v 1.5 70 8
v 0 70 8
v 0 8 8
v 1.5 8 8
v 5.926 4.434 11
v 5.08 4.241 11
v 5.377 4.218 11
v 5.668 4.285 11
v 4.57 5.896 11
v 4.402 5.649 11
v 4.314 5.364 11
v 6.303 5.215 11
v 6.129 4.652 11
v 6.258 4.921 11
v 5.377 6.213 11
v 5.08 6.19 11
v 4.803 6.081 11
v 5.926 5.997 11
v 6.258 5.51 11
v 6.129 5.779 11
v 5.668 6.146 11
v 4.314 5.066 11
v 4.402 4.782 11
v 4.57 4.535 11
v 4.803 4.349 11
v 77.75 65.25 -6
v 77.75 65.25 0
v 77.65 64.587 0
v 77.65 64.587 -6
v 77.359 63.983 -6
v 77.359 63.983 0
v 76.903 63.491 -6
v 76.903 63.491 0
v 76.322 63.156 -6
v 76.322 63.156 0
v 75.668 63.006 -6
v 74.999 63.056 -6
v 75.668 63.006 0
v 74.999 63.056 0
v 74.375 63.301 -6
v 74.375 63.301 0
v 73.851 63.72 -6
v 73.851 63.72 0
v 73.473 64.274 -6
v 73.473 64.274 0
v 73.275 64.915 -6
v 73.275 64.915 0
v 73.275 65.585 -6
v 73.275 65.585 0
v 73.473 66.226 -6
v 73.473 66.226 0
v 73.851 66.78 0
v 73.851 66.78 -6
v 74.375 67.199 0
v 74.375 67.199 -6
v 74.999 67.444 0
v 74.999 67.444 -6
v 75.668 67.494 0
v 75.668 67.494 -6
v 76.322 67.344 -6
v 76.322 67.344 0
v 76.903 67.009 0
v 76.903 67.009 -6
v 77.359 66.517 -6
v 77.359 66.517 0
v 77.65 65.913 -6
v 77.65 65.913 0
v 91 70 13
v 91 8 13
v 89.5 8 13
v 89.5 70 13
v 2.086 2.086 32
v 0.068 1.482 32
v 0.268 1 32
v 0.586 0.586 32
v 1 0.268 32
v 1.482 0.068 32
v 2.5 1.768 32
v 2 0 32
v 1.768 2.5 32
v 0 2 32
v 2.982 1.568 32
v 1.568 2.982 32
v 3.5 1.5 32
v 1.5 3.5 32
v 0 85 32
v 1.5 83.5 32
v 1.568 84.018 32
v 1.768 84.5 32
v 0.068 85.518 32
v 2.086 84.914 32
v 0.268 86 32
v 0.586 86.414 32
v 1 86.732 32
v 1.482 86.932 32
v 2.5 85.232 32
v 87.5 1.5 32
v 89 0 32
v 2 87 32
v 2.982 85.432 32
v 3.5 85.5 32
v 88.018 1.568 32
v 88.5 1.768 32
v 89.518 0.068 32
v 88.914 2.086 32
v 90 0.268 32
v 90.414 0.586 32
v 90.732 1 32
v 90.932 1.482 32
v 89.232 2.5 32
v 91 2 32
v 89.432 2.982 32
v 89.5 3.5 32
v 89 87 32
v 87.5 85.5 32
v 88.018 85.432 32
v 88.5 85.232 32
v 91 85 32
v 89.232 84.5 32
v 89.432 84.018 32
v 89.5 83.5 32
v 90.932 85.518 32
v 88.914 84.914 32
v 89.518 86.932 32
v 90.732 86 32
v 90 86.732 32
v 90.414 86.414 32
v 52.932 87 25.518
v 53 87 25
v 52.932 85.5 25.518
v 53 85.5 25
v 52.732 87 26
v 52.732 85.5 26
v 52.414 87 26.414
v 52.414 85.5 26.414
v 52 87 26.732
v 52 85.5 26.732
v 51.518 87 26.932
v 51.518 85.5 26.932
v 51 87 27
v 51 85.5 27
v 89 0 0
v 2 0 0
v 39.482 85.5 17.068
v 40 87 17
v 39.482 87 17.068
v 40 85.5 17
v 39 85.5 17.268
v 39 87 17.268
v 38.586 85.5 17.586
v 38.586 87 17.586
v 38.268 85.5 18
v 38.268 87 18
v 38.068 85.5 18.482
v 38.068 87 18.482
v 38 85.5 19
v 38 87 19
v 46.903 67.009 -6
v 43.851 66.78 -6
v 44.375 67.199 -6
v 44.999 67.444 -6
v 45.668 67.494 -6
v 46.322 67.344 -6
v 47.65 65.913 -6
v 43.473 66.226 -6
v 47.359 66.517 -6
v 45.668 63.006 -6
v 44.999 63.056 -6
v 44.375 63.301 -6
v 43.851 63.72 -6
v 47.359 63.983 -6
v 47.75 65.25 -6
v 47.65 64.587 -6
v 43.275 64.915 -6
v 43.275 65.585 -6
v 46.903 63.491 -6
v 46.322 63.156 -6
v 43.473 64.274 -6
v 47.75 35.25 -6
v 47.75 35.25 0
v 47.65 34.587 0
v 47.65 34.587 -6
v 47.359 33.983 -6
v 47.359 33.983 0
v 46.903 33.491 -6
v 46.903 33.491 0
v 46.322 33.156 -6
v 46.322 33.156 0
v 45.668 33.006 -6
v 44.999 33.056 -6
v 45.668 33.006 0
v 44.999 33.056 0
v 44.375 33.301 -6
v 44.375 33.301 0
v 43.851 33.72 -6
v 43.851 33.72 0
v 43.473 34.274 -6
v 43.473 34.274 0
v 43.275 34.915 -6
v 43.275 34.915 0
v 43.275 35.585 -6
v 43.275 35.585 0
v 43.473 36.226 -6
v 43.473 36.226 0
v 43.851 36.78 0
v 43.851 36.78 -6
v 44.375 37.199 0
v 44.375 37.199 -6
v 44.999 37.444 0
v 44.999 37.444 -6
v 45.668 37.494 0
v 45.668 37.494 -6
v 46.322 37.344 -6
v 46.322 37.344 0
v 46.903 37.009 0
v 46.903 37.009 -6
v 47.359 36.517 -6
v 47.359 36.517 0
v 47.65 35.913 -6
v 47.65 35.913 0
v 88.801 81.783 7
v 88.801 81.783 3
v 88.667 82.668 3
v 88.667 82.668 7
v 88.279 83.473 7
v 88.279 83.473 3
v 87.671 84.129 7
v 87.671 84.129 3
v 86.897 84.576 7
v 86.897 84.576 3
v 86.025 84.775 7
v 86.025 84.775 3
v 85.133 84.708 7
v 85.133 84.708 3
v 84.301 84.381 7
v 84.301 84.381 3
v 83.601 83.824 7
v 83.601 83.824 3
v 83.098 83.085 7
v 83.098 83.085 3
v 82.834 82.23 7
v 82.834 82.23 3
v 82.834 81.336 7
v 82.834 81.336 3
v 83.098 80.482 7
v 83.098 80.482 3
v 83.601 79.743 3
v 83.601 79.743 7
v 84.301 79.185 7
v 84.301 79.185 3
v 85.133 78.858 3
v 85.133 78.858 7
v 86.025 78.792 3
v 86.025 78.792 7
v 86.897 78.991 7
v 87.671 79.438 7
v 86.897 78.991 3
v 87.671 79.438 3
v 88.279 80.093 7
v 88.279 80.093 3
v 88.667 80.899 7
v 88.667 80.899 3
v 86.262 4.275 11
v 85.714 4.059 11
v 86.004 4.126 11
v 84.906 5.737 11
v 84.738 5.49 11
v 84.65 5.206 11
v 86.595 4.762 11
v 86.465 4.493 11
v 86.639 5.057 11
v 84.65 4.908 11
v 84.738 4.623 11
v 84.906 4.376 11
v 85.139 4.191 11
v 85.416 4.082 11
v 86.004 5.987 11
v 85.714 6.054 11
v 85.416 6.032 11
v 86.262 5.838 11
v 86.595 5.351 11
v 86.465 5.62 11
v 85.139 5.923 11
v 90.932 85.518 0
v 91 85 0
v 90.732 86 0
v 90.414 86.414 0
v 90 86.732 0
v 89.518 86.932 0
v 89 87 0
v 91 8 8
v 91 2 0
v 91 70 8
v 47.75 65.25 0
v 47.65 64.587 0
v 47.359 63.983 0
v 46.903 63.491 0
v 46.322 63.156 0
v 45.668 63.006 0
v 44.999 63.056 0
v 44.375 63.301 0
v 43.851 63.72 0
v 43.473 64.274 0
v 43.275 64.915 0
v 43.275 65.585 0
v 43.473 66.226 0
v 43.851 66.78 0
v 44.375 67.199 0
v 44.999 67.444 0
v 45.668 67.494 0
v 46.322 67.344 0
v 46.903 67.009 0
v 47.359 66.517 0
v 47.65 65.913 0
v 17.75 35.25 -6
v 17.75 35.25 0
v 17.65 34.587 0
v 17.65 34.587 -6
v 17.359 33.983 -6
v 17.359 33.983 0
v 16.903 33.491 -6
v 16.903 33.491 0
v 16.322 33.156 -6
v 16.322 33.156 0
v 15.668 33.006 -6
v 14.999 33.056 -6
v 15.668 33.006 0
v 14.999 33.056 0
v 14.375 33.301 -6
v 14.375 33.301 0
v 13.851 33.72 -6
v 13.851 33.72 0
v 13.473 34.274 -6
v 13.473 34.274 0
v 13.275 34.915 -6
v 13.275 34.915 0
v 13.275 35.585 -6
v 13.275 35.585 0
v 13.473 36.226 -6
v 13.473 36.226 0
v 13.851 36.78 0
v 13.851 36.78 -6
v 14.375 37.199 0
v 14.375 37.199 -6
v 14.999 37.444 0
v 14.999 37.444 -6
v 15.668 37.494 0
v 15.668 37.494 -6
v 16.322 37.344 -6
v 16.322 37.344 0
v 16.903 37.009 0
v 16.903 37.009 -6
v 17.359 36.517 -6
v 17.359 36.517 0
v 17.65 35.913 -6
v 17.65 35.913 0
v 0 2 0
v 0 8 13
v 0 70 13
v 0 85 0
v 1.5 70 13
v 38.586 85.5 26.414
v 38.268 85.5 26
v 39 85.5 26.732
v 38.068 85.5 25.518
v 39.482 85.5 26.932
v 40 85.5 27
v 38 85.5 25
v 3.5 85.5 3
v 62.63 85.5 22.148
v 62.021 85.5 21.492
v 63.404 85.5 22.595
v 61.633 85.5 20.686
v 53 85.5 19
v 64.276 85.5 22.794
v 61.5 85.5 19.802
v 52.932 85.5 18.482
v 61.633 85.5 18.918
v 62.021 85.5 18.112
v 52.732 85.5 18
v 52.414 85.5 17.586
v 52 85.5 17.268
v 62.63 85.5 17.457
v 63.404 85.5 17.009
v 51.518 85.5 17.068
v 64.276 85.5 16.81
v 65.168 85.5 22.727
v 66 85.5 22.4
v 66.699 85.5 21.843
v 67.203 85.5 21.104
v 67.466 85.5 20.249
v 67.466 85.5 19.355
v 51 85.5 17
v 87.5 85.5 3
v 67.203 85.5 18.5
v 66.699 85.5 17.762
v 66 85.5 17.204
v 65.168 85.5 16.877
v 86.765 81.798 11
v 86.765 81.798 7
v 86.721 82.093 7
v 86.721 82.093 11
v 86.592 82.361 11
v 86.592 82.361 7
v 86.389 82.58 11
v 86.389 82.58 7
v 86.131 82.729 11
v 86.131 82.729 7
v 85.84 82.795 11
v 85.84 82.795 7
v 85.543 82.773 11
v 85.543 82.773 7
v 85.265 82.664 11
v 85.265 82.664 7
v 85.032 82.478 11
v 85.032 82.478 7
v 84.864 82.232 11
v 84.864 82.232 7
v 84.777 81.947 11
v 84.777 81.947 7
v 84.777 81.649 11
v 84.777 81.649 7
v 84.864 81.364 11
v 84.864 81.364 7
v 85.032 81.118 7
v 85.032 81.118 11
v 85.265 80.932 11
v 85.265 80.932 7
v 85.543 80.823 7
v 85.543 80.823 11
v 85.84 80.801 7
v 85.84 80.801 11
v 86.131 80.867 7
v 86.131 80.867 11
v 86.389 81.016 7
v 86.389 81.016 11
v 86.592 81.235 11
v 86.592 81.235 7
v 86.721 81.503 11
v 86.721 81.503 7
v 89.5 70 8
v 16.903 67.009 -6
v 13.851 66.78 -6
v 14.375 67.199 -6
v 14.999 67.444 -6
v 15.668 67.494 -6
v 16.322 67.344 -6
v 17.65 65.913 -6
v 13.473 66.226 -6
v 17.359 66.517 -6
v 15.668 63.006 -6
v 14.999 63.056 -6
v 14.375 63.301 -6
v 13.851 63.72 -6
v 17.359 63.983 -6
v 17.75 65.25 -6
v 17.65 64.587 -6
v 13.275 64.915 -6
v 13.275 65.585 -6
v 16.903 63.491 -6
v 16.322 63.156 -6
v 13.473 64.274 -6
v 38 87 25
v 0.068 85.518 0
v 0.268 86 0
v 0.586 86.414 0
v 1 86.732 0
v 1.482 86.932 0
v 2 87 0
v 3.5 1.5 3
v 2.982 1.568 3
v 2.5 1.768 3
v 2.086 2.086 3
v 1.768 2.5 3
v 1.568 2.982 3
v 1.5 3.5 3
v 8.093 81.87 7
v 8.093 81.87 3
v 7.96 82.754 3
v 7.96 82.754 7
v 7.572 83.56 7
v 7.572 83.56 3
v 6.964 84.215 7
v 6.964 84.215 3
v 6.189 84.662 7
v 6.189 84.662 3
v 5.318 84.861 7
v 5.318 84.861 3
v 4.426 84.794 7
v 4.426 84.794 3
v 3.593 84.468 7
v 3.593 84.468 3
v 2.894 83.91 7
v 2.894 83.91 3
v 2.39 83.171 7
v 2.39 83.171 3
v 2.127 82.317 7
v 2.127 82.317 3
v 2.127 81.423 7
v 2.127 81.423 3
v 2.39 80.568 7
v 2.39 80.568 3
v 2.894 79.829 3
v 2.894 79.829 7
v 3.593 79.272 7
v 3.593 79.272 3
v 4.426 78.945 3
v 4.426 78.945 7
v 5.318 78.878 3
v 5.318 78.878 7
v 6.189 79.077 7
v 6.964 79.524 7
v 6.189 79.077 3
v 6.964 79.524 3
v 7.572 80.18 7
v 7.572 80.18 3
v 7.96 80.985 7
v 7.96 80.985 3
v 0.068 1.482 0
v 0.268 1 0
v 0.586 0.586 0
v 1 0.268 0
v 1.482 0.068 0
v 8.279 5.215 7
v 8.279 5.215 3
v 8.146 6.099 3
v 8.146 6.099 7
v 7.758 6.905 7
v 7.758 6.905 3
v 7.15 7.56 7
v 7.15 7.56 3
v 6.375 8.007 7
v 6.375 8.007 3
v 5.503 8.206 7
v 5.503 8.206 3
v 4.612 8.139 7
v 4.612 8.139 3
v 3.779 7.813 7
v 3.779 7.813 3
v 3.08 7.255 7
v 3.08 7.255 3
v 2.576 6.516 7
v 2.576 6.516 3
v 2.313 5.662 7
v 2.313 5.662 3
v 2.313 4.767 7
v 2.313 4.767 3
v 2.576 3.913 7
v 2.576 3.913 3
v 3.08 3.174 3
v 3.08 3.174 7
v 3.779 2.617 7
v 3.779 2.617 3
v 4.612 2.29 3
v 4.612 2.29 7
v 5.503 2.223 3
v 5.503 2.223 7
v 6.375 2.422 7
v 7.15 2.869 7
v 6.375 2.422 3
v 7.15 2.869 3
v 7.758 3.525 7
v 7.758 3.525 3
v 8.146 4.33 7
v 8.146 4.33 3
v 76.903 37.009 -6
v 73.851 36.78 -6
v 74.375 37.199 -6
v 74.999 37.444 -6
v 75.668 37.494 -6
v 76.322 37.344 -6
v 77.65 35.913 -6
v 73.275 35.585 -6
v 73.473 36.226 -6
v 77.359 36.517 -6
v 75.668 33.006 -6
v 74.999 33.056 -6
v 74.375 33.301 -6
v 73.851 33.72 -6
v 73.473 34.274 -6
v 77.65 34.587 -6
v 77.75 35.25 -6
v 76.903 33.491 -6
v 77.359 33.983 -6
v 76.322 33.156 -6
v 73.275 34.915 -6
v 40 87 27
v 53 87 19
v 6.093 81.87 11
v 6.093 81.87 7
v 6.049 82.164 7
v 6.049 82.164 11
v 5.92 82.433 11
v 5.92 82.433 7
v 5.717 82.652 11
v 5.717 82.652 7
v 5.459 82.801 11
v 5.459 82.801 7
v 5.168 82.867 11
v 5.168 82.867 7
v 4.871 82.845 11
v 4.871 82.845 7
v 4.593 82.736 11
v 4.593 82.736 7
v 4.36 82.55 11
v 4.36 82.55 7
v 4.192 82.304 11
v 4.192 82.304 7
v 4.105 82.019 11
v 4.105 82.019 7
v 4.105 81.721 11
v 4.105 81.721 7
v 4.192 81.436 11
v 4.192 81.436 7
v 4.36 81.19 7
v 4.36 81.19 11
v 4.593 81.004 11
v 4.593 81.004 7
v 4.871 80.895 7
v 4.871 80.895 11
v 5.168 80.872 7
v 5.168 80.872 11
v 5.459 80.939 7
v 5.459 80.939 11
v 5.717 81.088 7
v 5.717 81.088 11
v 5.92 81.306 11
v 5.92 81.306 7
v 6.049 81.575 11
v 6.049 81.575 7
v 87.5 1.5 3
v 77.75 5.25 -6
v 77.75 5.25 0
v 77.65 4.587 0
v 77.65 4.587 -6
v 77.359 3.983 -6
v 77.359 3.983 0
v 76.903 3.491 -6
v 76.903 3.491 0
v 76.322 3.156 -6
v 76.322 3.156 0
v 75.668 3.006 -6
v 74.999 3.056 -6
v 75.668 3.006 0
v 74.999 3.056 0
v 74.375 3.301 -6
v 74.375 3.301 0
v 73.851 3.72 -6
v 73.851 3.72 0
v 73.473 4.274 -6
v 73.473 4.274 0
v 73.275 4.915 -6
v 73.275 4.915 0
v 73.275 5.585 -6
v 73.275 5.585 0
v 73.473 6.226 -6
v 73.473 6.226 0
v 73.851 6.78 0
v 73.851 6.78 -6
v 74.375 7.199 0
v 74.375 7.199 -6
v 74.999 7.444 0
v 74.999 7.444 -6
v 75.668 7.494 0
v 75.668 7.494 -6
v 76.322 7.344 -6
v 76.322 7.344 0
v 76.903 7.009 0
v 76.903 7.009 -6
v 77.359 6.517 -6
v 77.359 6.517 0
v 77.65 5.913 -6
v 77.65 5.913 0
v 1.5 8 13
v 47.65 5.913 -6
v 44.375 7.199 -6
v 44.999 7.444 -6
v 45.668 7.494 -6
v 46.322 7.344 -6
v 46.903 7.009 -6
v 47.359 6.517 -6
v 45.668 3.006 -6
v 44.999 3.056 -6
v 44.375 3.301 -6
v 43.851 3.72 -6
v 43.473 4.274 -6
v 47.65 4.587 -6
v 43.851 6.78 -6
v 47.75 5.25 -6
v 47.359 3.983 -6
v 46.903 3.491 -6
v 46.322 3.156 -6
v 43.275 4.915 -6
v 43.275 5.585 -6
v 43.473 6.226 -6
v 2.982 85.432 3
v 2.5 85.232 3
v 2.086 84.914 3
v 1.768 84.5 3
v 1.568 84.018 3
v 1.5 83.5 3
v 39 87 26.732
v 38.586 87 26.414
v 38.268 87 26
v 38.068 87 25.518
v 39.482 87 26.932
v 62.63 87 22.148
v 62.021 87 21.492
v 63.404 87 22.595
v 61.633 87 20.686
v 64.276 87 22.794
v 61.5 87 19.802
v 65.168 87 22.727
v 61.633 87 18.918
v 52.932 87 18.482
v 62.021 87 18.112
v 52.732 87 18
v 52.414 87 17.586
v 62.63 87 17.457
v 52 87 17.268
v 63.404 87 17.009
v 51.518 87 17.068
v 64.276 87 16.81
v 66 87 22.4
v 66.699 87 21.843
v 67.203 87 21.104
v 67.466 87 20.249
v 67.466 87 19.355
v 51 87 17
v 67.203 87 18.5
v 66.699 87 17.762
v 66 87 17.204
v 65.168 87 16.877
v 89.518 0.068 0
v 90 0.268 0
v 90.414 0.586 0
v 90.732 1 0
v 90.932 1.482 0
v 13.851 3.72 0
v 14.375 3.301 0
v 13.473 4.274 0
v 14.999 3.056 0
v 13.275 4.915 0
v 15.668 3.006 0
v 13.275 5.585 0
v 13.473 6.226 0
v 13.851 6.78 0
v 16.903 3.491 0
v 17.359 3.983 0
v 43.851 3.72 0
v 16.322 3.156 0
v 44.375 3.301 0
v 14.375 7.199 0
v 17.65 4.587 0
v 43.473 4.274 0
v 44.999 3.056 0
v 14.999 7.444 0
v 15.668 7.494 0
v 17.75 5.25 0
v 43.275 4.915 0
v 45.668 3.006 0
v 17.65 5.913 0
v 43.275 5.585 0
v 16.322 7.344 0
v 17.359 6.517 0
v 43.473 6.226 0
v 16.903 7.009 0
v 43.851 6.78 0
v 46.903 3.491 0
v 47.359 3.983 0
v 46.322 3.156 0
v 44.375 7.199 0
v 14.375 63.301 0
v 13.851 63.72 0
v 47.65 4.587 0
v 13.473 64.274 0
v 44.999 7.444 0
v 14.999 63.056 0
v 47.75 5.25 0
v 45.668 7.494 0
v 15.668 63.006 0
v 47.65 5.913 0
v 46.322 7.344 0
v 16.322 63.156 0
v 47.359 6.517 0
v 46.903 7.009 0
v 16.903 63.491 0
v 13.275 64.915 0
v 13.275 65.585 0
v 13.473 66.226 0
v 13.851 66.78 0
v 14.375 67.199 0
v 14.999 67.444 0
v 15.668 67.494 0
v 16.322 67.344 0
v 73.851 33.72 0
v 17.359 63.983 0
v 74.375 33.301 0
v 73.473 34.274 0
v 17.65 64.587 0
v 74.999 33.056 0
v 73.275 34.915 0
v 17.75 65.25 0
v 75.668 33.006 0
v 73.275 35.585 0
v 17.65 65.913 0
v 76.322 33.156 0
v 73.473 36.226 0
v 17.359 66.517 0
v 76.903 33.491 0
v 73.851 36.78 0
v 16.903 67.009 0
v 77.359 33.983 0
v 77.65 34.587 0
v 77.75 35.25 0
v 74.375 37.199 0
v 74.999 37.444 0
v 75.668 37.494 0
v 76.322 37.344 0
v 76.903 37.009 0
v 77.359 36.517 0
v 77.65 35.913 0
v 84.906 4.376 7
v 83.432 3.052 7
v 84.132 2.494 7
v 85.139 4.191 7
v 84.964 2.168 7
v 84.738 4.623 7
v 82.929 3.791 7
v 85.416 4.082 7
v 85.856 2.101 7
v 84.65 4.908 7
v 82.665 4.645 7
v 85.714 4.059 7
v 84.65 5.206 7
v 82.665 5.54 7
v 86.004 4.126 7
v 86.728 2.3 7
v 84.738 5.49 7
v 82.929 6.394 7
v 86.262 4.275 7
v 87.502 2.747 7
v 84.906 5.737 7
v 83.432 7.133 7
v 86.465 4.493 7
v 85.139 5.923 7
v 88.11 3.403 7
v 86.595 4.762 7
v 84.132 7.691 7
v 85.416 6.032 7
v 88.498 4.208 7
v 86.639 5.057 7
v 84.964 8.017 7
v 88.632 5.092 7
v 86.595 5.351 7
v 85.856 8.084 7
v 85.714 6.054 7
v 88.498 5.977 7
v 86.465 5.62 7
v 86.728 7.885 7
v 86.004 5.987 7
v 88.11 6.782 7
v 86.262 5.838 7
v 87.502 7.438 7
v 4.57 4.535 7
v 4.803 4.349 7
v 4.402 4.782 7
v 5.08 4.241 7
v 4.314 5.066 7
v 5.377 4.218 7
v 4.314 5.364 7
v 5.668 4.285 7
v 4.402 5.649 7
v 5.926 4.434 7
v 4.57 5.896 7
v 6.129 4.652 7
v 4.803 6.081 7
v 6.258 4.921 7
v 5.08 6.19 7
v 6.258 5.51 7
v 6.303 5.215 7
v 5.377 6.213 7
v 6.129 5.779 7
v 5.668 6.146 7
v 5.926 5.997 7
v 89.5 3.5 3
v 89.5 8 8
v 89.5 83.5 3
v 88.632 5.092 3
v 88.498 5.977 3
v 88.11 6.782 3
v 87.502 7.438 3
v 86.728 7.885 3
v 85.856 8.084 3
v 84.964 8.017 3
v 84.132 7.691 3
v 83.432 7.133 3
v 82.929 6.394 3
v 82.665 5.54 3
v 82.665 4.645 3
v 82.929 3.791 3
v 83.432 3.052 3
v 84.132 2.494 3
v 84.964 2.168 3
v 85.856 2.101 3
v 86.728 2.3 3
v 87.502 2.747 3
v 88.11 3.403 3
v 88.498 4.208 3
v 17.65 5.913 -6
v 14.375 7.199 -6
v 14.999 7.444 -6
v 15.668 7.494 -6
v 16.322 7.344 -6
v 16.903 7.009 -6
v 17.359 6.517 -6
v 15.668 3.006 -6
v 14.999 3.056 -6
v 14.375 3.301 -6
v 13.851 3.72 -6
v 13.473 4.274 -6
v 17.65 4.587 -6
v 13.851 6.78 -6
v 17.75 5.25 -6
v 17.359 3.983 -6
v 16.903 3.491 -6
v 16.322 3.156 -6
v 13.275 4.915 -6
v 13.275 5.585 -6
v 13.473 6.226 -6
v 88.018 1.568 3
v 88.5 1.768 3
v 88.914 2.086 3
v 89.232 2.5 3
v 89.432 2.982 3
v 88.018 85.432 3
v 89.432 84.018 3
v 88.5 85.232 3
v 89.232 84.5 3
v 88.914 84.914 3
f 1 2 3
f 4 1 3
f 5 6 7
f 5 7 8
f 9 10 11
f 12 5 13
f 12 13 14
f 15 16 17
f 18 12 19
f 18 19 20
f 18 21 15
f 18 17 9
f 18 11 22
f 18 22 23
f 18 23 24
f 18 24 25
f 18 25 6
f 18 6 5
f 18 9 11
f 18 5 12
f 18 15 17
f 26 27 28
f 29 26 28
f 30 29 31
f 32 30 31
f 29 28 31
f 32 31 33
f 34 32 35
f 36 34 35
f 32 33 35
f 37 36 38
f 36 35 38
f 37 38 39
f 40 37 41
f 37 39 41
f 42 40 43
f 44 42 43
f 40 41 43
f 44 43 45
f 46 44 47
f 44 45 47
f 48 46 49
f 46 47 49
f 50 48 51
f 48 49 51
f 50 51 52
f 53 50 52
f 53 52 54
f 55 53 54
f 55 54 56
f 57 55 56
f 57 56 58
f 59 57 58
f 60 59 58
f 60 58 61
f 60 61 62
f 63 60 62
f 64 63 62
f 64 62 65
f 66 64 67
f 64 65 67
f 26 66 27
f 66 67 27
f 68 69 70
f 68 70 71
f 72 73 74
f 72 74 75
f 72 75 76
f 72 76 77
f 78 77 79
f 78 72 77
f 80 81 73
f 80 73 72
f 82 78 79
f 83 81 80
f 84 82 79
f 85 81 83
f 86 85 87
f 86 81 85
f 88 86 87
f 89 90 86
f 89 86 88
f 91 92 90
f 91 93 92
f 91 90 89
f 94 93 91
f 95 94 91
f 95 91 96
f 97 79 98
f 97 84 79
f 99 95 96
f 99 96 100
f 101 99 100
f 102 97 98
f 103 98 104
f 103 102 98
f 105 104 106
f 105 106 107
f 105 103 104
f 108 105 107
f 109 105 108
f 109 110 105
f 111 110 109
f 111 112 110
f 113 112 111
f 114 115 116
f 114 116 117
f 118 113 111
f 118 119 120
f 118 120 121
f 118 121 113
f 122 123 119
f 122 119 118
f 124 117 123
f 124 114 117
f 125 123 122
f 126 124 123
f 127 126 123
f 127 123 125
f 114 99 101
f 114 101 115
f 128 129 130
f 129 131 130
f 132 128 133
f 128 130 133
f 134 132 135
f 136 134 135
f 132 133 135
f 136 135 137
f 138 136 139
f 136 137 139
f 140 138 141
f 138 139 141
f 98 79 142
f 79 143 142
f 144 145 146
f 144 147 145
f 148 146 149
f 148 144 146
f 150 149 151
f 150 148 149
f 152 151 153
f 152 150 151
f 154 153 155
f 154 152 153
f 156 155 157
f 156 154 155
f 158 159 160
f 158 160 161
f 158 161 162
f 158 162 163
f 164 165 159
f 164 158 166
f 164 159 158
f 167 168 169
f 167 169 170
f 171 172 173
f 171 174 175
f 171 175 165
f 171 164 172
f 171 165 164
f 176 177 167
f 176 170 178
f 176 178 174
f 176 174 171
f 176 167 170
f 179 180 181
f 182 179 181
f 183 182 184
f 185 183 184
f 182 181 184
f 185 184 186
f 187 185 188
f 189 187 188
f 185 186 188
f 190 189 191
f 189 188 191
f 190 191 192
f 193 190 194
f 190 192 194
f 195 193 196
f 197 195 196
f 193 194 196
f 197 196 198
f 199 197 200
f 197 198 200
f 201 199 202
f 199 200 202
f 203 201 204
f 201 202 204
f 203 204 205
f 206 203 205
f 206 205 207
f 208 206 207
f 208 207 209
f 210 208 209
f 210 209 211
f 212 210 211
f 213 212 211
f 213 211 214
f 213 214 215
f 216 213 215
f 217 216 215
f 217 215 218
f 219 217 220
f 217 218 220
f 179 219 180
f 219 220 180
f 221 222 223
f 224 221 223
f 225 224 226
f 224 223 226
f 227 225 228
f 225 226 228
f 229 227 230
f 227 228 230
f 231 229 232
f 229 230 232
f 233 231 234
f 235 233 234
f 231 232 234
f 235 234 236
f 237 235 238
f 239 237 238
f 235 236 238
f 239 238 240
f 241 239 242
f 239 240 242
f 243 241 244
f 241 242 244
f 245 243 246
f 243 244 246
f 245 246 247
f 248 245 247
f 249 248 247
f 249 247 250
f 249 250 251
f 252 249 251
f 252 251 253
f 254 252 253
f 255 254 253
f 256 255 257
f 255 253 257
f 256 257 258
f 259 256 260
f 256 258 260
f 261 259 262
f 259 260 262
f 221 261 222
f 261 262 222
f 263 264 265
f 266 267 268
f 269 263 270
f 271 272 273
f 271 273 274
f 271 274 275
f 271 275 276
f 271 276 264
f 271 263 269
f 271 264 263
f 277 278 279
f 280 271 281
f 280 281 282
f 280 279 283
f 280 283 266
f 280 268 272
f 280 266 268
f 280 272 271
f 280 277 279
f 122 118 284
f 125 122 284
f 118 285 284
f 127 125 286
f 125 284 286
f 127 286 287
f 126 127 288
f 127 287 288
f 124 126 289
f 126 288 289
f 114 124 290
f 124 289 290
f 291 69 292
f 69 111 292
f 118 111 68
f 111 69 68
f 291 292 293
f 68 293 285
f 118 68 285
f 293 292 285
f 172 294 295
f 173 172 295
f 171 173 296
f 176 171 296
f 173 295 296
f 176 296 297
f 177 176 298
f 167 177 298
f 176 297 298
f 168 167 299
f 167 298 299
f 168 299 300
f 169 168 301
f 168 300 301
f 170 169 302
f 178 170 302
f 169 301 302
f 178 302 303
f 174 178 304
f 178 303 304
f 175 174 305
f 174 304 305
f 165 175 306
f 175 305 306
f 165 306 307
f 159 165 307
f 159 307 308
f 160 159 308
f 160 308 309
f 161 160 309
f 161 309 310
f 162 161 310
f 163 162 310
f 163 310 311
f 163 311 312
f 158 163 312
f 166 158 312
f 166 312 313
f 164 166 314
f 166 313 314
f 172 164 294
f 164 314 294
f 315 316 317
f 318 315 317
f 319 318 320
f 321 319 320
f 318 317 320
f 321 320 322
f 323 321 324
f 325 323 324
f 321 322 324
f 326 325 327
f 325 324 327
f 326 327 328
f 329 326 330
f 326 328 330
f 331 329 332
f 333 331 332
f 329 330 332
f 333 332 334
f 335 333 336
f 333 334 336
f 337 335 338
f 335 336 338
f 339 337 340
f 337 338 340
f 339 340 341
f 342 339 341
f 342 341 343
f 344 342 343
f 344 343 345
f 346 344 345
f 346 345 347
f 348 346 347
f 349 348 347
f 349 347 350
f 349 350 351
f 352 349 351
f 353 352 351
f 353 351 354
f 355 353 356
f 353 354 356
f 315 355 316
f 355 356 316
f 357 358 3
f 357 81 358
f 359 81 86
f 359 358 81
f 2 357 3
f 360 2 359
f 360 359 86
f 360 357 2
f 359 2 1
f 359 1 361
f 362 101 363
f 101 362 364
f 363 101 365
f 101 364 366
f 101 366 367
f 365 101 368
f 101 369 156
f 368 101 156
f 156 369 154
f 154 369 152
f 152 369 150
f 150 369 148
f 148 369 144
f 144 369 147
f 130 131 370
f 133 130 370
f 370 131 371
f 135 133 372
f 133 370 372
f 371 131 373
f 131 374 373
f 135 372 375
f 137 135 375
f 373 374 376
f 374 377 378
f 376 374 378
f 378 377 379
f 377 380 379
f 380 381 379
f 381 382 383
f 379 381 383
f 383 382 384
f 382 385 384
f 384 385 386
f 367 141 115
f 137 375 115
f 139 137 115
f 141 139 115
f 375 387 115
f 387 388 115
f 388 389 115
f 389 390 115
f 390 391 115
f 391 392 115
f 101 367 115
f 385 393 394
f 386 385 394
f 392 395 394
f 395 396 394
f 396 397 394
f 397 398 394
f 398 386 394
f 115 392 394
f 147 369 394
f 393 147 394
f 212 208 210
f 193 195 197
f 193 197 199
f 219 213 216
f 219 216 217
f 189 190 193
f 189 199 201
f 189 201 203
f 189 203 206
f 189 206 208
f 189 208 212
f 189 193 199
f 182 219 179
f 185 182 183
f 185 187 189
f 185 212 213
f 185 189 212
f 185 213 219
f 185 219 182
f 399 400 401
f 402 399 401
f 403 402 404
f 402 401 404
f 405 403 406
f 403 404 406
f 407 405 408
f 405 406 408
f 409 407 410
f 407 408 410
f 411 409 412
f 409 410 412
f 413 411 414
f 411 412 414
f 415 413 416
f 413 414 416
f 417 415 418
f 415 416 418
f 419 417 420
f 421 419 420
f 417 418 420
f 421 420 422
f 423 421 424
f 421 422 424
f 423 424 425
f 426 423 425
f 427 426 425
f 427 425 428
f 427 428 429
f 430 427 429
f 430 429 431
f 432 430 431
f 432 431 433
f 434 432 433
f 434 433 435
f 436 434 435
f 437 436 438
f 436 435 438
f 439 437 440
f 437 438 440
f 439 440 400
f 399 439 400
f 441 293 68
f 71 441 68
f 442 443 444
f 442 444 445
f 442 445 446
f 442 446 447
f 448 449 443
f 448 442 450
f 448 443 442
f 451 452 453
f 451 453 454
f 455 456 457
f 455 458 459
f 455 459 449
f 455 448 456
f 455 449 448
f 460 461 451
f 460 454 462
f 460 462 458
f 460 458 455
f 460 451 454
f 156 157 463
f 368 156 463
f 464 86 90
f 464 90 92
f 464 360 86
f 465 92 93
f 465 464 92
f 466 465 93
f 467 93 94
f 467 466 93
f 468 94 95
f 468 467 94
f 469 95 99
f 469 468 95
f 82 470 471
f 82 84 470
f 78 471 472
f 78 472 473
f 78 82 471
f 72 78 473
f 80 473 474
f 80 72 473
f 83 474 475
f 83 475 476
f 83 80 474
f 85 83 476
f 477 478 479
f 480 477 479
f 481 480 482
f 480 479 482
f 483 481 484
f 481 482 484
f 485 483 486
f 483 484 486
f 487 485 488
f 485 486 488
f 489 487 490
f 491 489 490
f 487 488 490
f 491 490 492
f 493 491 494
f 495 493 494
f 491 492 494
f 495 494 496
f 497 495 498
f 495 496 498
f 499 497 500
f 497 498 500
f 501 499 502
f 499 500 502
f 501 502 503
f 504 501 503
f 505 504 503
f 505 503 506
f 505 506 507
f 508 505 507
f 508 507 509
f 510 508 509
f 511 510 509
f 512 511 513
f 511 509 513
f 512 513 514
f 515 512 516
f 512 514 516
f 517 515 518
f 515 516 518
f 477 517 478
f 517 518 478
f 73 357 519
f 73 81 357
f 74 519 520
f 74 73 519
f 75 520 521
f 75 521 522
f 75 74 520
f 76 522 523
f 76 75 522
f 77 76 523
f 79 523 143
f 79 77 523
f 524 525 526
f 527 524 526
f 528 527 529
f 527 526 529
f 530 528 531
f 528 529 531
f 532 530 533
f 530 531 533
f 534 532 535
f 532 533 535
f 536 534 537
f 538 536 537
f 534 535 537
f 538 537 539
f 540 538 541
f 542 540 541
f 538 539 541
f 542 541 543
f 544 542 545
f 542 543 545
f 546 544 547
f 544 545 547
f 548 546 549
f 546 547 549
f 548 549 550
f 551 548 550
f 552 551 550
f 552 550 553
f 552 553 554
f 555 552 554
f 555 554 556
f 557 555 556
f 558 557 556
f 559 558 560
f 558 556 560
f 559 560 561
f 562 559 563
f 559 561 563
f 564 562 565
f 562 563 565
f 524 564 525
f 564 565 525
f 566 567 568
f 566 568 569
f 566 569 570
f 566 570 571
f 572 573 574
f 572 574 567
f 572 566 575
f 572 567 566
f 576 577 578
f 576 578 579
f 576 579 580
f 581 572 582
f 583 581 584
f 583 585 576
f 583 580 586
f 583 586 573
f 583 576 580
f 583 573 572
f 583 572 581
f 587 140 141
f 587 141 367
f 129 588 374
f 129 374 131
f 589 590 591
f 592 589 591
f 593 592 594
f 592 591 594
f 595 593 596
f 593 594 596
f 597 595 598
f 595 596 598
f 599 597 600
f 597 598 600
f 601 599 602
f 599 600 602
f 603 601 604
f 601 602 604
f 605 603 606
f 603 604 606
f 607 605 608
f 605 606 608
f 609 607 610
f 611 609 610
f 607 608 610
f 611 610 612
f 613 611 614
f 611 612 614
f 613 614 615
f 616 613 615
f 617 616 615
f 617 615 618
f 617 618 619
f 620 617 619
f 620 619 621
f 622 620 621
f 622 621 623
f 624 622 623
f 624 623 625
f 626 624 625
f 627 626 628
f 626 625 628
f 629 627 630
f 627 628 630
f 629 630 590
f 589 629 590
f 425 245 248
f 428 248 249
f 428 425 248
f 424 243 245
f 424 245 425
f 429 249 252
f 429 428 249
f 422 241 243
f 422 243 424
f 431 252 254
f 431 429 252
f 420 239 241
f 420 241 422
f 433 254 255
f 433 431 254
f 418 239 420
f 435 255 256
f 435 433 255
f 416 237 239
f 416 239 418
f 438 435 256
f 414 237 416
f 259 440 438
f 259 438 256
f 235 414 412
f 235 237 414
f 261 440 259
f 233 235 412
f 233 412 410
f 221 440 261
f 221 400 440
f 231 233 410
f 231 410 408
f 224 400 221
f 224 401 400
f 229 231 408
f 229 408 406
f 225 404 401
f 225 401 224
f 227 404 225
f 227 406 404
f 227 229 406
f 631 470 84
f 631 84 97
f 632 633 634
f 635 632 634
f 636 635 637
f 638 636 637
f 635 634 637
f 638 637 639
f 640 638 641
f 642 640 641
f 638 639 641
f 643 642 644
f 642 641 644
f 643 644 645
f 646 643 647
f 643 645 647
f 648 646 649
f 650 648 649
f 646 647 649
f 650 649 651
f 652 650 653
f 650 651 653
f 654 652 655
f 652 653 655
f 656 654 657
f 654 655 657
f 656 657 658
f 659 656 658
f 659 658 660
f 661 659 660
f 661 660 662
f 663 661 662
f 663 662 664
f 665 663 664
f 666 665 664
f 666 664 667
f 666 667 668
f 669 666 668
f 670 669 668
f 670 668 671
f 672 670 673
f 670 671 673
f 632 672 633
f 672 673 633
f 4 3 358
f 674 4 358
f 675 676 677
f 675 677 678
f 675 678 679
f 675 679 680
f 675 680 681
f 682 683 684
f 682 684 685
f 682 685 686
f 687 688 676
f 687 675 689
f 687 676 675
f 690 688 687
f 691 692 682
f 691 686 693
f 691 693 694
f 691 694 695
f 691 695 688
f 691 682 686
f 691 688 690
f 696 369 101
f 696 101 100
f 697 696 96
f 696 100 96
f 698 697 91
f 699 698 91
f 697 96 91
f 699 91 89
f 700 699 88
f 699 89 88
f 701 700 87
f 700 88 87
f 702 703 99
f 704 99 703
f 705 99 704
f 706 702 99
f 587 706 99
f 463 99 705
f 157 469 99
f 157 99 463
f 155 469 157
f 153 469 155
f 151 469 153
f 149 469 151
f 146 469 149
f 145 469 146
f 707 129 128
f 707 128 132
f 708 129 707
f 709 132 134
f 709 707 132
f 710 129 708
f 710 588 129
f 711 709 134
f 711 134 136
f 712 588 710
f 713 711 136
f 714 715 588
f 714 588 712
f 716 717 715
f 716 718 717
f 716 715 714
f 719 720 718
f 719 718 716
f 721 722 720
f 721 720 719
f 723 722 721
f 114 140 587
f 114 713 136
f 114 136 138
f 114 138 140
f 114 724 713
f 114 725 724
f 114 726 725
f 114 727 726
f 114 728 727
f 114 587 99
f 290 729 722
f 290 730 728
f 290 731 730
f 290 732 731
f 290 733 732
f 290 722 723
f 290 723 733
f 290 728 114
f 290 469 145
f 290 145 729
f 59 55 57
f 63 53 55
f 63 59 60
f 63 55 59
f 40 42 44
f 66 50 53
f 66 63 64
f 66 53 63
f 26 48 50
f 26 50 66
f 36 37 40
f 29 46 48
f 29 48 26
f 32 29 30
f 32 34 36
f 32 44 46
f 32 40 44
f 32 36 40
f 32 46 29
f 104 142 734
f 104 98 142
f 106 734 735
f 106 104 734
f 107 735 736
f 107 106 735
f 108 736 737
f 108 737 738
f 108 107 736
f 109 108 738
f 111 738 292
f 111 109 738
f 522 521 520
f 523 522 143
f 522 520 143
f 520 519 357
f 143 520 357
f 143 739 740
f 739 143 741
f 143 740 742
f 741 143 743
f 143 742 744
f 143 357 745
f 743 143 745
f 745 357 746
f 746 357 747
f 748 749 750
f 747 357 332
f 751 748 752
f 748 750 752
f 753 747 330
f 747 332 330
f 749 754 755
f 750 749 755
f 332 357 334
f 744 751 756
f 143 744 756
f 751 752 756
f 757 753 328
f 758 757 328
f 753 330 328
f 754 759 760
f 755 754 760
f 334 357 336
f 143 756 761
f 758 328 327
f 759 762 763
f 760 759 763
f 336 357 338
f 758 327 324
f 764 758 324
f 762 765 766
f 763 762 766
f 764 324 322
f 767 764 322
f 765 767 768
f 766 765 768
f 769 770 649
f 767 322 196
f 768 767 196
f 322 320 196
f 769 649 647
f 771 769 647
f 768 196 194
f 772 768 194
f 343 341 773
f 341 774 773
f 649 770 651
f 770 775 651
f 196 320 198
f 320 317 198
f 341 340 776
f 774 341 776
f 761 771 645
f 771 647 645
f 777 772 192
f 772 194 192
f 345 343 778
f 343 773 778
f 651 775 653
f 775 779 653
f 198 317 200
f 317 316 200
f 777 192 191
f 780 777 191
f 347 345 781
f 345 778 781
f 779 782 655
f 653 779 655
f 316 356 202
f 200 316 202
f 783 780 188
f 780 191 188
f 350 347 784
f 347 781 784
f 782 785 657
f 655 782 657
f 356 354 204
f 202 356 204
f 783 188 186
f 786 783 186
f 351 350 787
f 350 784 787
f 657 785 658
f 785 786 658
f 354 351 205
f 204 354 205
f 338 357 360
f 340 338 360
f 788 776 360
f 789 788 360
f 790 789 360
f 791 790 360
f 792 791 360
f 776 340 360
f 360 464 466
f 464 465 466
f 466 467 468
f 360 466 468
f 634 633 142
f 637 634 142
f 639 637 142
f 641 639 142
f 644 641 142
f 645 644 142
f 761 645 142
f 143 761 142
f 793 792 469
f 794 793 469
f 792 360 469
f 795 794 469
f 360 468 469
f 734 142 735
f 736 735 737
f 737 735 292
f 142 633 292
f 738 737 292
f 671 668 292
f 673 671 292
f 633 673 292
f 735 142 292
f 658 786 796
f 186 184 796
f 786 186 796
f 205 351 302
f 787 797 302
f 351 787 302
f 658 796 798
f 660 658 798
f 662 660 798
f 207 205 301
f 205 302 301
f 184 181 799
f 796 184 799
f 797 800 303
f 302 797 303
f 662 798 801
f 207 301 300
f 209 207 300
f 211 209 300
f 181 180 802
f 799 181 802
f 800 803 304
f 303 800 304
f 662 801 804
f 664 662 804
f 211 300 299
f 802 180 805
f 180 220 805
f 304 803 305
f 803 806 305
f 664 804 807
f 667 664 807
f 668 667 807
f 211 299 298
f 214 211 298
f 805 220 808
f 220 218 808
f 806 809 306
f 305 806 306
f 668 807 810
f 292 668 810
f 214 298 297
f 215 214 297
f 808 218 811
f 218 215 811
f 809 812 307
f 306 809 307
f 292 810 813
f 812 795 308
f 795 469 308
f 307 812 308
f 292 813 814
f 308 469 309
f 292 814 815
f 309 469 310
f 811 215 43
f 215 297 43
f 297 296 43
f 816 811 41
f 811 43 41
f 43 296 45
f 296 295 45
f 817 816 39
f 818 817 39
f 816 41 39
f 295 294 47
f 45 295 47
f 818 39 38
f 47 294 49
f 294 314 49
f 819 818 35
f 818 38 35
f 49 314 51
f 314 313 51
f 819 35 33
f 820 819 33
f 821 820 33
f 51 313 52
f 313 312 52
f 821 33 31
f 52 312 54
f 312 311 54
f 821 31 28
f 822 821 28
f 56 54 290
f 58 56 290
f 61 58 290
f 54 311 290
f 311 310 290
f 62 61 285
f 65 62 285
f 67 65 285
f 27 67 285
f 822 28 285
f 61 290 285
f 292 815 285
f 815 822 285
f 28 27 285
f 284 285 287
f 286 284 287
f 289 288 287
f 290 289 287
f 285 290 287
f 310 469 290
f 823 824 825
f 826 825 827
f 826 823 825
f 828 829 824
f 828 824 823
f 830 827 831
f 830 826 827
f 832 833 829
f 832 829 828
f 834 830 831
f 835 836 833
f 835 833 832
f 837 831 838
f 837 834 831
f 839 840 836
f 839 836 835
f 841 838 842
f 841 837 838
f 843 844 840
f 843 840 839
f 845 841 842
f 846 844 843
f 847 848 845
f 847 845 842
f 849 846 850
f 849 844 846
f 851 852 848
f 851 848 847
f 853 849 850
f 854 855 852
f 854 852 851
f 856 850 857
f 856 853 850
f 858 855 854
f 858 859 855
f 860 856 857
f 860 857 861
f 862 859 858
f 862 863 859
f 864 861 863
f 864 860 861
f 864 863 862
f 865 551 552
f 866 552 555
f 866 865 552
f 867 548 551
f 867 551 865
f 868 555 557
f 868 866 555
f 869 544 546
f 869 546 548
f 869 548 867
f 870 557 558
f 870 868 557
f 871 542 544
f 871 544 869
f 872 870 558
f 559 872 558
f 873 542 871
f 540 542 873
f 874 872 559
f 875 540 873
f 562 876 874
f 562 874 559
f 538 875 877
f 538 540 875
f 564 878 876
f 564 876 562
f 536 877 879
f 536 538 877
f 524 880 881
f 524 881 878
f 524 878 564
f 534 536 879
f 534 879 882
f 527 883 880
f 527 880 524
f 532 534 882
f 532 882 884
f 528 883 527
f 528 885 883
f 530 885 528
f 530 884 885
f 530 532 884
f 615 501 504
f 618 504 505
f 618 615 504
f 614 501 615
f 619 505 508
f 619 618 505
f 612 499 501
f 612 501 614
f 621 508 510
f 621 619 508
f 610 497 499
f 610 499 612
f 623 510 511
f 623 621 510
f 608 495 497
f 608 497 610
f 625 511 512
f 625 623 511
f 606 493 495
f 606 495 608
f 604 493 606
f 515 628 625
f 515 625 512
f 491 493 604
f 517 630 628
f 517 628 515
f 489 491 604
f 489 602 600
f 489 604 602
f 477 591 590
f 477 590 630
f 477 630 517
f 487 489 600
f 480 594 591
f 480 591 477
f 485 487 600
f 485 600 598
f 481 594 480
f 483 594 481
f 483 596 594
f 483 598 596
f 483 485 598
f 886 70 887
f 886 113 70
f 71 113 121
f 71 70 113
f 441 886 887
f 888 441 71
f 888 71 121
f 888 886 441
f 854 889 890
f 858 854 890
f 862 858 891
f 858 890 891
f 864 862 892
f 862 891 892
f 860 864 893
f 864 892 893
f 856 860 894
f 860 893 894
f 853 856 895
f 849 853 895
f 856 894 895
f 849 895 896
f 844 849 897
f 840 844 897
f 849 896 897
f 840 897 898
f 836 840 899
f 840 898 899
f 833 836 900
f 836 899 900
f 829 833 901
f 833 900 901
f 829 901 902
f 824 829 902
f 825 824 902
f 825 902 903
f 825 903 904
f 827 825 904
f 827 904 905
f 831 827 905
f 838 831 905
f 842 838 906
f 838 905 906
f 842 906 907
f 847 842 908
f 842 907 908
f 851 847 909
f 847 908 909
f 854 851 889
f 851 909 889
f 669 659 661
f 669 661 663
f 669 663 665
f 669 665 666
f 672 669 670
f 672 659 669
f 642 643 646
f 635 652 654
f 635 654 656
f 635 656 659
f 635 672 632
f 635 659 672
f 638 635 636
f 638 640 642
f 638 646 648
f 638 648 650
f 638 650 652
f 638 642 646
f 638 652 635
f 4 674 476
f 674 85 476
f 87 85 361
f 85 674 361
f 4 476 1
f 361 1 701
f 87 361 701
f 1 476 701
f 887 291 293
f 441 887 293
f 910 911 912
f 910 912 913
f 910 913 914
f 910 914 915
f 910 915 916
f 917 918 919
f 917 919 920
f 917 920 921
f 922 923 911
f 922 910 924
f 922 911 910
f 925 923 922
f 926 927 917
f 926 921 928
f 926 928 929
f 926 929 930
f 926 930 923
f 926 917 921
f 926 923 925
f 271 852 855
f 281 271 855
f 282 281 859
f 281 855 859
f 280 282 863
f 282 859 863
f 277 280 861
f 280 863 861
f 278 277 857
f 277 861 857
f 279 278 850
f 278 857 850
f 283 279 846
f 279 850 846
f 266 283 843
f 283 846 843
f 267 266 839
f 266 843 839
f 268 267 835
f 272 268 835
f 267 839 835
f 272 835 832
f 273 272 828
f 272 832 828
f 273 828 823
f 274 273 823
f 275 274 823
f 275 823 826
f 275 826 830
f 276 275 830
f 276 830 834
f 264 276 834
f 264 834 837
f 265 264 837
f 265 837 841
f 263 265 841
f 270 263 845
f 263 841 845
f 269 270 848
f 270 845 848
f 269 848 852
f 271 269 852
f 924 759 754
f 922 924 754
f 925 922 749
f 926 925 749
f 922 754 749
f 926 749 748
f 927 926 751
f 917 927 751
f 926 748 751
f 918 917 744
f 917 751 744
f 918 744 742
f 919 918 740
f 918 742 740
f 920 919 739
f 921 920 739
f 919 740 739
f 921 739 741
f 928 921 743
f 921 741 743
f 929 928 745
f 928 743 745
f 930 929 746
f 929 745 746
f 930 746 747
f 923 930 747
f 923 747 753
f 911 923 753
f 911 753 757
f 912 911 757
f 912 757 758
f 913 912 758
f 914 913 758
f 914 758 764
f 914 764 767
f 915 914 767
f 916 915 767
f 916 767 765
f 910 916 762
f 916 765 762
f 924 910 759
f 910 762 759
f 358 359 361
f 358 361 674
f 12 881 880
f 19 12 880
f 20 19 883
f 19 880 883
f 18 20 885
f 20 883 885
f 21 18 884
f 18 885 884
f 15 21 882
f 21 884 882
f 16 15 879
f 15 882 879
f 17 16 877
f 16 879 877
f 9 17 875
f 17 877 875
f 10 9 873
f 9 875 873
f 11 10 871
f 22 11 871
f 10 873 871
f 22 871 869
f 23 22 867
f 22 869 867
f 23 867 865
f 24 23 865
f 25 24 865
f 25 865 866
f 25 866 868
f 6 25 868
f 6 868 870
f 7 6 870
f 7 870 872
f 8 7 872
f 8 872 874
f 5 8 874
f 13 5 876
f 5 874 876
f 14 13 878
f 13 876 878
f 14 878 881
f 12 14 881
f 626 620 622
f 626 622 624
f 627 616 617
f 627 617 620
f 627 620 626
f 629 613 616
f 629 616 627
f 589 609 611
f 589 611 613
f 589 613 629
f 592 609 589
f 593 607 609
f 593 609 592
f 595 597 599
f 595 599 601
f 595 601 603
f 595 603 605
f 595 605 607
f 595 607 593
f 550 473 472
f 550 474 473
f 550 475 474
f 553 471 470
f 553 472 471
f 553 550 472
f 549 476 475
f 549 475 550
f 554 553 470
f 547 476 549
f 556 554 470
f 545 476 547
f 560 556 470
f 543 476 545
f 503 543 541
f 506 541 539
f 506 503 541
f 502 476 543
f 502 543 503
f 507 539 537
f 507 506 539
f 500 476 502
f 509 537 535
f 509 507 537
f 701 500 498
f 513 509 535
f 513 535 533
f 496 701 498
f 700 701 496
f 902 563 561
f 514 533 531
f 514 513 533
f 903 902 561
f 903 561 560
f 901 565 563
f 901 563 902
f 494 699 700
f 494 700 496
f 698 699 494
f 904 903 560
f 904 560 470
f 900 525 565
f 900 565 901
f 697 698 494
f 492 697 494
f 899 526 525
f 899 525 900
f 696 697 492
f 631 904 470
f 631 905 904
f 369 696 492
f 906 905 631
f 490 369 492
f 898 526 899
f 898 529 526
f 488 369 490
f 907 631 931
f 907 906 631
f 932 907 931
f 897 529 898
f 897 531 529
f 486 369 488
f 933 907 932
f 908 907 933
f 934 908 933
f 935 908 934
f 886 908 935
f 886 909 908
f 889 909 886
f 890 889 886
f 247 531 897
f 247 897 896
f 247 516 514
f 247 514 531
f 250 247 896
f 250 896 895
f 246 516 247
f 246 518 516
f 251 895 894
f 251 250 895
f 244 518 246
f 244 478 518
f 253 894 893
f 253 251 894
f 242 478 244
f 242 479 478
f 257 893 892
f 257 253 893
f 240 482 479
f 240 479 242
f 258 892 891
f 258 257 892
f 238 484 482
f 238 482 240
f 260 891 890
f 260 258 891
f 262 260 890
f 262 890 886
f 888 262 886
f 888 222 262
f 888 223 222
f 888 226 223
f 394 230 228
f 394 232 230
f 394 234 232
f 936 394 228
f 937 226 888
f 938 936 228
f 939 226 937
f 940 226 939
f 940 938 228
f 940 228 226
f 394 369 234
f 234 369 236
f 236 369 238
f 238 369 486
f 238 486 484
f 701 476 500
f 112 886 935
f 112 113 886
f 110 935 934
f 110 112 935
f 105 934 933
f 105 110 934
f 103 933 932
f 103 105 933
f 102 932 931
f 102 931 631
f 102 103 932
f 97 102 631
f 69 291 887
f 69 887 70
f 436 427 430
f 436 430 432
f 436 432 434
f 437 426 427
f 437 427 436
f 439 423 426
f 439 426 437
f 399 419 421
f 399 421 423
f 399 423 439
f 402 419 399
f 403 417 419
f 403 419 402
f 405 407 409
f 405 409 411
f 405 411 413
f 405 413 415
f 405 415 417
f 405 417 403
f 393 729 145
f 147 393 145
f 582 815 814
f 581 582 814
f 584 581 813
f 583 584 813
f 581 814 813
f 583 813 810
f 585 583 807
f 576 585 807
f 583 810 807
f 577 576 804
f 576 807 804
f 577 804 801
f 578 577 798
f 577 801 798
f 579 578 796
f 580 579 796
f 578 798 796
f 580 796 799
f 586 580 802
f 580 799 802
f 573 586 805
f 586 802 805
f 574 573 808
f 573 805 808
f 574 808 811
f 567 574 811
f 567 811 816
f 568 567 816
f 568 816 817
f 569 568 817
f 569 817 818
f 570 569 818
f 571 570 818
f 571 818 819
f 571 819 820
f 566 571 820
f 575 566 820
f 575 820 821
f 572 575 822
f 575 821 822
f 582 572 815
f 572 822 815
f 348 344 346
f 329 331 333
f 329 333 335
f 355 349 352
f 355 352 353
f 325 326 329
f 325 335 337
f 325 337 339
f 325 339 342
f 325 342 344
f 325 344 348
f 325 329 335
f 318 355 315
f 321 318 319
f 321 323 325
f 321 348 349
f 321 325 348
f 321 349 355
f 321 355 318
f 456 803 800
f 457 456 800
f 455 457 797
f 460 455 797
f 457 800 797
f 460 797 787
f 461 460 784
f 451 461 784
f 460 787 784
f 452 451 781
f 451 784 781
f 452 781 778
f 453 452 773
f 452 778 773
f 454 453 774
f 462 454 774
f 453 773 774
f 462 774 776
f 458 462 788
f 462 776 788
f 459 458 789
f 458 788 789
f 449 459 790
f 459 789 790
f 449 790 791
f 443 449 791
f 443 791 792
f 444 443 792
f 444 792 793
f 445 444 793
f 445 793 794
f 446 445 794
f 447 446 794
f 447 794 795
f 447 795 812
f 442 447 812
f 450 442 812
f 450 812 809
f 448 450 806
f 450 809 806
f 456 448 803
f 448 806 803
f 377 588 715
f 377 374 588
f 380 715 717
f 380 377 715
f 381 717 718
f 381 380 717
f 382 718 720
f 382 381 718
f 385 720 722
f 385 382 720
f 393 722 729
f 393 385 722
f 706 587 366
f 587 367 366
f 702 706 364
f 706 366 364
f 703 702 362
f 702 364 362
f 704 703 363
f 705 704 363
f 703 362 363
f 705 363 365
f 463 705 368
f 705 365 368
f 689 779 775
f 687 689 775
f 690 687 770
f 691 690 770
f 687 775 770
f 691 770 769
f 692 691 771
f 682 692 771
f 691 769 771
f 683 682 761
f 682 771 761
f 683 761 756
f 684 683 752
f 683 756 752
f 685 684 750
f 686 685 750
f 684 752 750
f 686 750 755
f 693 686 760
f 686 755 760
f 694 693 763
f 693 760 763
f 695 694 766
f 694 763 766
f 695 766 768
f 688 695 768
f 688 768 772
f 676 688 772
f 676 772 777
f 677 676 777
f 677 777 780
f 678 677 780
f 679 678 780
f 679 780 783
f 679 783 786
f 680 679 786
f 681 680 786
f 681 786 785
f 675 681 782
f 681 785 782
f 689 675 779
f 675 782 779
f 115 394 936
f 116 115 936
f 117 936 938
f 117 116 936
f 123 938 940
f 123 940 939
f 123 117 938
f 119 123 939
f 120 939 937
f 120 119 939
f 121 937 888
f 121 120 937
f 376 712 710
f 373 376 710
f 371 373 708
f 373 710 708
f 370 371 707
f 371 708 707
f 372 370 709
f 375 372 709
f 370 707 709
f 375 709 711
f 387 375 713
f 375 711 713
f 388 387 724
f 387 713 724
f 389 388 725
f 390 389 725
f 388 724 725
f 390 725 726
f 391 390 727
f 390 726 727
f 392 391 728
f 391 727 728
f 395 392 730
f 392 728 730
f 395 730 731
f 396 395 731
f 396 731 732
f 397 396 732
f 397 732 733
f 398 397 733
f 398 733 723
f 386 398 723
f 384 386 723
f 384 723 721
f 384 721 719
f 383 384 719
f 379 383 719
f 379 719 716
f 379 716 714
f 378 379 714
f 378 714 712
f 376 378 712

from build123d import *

# Parameters (mm, degrees)
SKETCH007_R      = 2.25
EXTRUDE007_DEPTH = 6
SKETCH006_R      = 3
SKETCH006_W      = 15
SKETCH006_H      = 10
EXTRUDE006_DEPTH = 2
SKETCH005_W      = 62
SKETCH005_H      = 5
EXTRUDE005_DEPTH = 2
SKETCH004_W      = 62
SKETCH004_H      = 5
EXTRUDE004_DEPTH = 2
SKETCH003_R      = 1
EXTRUDE003_DEPTH = 4
SKETCH002_R      = 3
EXTRUDE002_DEPTH = 4
SKETCH001_W      = 88
SKETCH001_H      = 84
EXTRUDE001_DEPTH = 29
SKETCH_W         = 91
SKETCH_H         = 87
EXTRUDE_DEPTH    = 29
BOX_W            = 91
BOX_H            = 87
BOX_DEPTH        = 3
FILLET_R         = 2
FILLET001_R      = 2
FILLET002_R      = 2
FILLET003_R      = 2
FILLET004_R      = 2
FILLET005_R      = 2
FILLET006_R      = 2
FILLET007_R      = 2
FILLET008_R      = 2
FILLET009_R      = 2
FILLET010_R      = 2
FILLET011_R      = 2


with BuildPart() as extrude007:
    # Sketch007 (on Face52 of Fillet011) → Extrude007 (new body)
    with BuildSketch(Plane(origin=(0, 0, 0), x_dir=(1, 0, 0), z_dir=(0, 0, -1))):
        with Locations((45.5, -5.25)):
            Circle(SKETCH007_R)
        with Locations((75.5, -5.25)):
            Circle(SKETCH007_R)
        with Locations((15.5, -5.25)):
            Circle(SKETCH007_R)
        with Locations((15.5, -35.25)):
            Circle(SKETCH007_R)
        with Locations((45.5, -35.25)):
            Circle(SKETCH007_R)
        with Locations((75.5, -35.25)):
            Circle(SKETCH007_R)
        with Locations((15.5, -65.25)):
            Circle(SKETCH007_R)
        with Locations((45.5, -65.25)):
            Circle(SKETCH007_R)
        with Locations((75.5, -65.25)):
            Circle(SKETCH007_R)
    extrude(amount=EXTRUDE007_DEPTH)


with BuildPart() as extrude006:
    # Sketch006 (on Face13 of Cut002) → Extrude006 (new body)
    with BuildSketch(Plane(origin=(0, 87, 0), x_dir=(-1, 0, 0), z_dir=(0, 1, 0))):
        with Locations((-64.5, 19.802082)):
            Circle(SKETCH006_R)
        with Locations((-45.5, 22)):
            Rectangle(SKETCH006_W, SKETCH006_H)
    extrude(amount=-EXTRUDE006_DEPTH)


with BuildPart() as extrude005:
    # Sketch005 (on Face17 of Cut001) → Extrude005 (new body)
    with BuildSketch(Plane(origin=(0, 0, 0), x_dir=(0, -1, 0), z_dir=(-1, 0, 0))):
        with Locations((-39, 10.5)):
            Rectangle(SKETCH005_W, SKETCH005_H)
    extrude(amount=-EXTRUDE005_DEPTH)


with BuildPart() as extrude004:
    # Sketch004 (on Face10 of Fusion002) → Extrude004 (new body)
    with BuildSketch(Plane.YZ.offset(91)):
        with Locations((39, 10.5)):
            Rectangle(SKETCH004_W, SKETCH004_H)
    extrude(amount=-EXTRUDE004_DEPTH)


with BuildPart() as extrude003:
    # Sketch003 (on Face34 of Fusion001) → Extrude003 (new body)
    with BuildSketch(Plane.XY.offset(7)):
        with Locations((5.302703, 5.215435)):
            Circle(SKETCH003_R)
        with Locations((85.638989, 5.056605)):
            Circle(SKETCH003_R)
        with Locations((85.765417, 81.797994)):
            Circle(SKETCH003_R)
        with Locations((5.093359, 81.86968)):
            Circle(SKETCH003_R)
    extrude(amount=EXTRUDE003_DEPTH)


with BuildPart() as extrude002:
    # Sketch002 (on Face18 of Fillet007) → Extrude002 (new body)
    with BuildSketch(Plane.XY.offset(3)):
        with Locations((5.093359, 81.86968)):
            Circle(SKETCH002_R)
        with Locations((85.80056, 81.783242)):
            Circle(SKETCH002_R)
        with Locations((5.279273, 5.214621)):
            Circle(SKETCH002_R)
        with Locations((85.631504, 5.092482)):
            Circle(SKETCH002_R)
    extrude(amount=EXTRUDE002_DEPTH)


with BuildPart() as extrude001:
    # Sketch001 (on Face6 of Box) → Extrude001 (new body)
    with BuildSketch(Plane.XY.offset(3)):
        with Locations((45.5, 43.5)):
            Rectangle(SKETCH001_W, SKETCH001_H)
    extrude(amount=EXTRUDE001_DEPTH)


with BuildPart() as cut:
    # Sketch (on Face6 of Box) → Extrude (new body)
    with BuildSketch(Plane.XY.offset(3)):
        with Locations((45.5, 43.5)):
            Rectangle(SKETCH_W, SKETCH_H)
    extrude(amount=EXTRUDE_DEPTH)

    # Cut: cut Extrude001
    add(extrude001.part, mode=Mode.SUBTRACT)


with BuildPart() as esp_case_bottom:
    # Box → Box (new body)
    with BuildSketch(Plane.XY):
        with Locations((45.5, 43.5)):
            Rectangle(BOX_W, BOX_H)
    extrude(amount=BOX_DEPTH)

    # Fusion: union Cut
    add(cut.part)

    # Fillet
    fillet_edges = [esp_case_bottom.edges().sort_by_distance(p)[0] for p in [
        (0, 87, 1.5),
        (0, 87, 17.5),
    ]]
    fillet(fillet_edges, radius=FILLET_R)

    # Fillet001
    fillet001_edges = [esp_case_bottom.edges().sort_by_distance(p)[0] for p in [
        (1.5, 85.5, 17.5),
    ]]
    fillet(fillet001_edges, radius=FILLET001_R)

    # Fillet002
    fillet002_edges = [esp_case_bottom.edges().sort_by_distance(p)[0] for p in [
        (0, 0, 17.5),
    ]]
    fillet(fillet002_edges, radius=FILLET002_R)

    # Fillet003
    fillet003_edges = [esp_case_bottom.edges().sort_by_distance(p)[0] for p in [
        (91, 0, 17.5),
    ]]
    fillet(fillet003_edges, radius=FILLET003_R)

    # Fillet004
    fillet004_edges = [esp_case_bottom.edges().sort_by_distance(p)[0] for p in [
        (91, 87, 17.5),
    ]]
    fillet(fillet004_edges, radius=FILLET004_R)

    # Fillet005
    fillet005_edges = [esp_case_bottom.edges().sort_by_distance(p)[0] for p in [
        (89.5, 85.5, 17.5),
    ]]
    fillet(fillet005_edges, radius=FILLET005_R)

    # Fillet006
    fillet006_edges = [esp_case_bottom.edges().sort_by_distance(p)[0] for p in [
        (89.5, 1.5, 17.5),
    ]]
    fillet(fillet006_edges, radius=FILLET006_R)

    # Fillet007
    fillet007_edges = [esp_case_bottom.edges().sort_by_distance(p)[0] for p in [
        (1.5, 1.5, 17.5),
    ]]
    fillet(fillet007_edges, radius=FILLET007_R)

    # Fusion001: union Extrude002
    add(extrude002.part)

    # Fusion002: union Extrude003
    add(extrude003.part)

    # Cut001: cut Extrude004
    add(extrude004.part, mode=Mode.SUBTRACT)

    # Cut002: cut Extrude005
    add(extrude005.part, mode=Mode.SUBTRACT)

    # Cut003: cut Extrude006
    add(extrude006.part, mode=Mode.SUBTRACT)

    # Fillet008
    fillet008_edges = [esp_case_bottom.edges().sort_by_distance(p)[0] for p in [
        (38, 86.25, 17),
    ]]
    fillet(fillet008_edges, radius=FILLET008_R)

    # Fillet009
    fillet009_edges = [esp_case_bottom.edges().sort_by_distance(p)[0] for p in [
        (53, 86.25, 27),
    ]]
    fillet(fillet009_edges, radius=FILLET009_R)

    # Fillet010
    fillet010_edges = [esp_case_bottom.edges().sort_by_distance(p)[0] for p in [
        (53, 86.25, 17),
    ]]
    fillet(fillet010_edges, radius=FILLET010_R)

    # Fillet011
    fillet011_edges = [esp_case_bottom.edges().sort_by_distance(p)[0] for p in [
        (38, 86.25, 27),
    ]]
    fillet(fillet011_edges, radius=FILLET011_R)

    # Fusion003: union Extrude007
    add(extrude007.part)


solid = esp_case_bottom.part
